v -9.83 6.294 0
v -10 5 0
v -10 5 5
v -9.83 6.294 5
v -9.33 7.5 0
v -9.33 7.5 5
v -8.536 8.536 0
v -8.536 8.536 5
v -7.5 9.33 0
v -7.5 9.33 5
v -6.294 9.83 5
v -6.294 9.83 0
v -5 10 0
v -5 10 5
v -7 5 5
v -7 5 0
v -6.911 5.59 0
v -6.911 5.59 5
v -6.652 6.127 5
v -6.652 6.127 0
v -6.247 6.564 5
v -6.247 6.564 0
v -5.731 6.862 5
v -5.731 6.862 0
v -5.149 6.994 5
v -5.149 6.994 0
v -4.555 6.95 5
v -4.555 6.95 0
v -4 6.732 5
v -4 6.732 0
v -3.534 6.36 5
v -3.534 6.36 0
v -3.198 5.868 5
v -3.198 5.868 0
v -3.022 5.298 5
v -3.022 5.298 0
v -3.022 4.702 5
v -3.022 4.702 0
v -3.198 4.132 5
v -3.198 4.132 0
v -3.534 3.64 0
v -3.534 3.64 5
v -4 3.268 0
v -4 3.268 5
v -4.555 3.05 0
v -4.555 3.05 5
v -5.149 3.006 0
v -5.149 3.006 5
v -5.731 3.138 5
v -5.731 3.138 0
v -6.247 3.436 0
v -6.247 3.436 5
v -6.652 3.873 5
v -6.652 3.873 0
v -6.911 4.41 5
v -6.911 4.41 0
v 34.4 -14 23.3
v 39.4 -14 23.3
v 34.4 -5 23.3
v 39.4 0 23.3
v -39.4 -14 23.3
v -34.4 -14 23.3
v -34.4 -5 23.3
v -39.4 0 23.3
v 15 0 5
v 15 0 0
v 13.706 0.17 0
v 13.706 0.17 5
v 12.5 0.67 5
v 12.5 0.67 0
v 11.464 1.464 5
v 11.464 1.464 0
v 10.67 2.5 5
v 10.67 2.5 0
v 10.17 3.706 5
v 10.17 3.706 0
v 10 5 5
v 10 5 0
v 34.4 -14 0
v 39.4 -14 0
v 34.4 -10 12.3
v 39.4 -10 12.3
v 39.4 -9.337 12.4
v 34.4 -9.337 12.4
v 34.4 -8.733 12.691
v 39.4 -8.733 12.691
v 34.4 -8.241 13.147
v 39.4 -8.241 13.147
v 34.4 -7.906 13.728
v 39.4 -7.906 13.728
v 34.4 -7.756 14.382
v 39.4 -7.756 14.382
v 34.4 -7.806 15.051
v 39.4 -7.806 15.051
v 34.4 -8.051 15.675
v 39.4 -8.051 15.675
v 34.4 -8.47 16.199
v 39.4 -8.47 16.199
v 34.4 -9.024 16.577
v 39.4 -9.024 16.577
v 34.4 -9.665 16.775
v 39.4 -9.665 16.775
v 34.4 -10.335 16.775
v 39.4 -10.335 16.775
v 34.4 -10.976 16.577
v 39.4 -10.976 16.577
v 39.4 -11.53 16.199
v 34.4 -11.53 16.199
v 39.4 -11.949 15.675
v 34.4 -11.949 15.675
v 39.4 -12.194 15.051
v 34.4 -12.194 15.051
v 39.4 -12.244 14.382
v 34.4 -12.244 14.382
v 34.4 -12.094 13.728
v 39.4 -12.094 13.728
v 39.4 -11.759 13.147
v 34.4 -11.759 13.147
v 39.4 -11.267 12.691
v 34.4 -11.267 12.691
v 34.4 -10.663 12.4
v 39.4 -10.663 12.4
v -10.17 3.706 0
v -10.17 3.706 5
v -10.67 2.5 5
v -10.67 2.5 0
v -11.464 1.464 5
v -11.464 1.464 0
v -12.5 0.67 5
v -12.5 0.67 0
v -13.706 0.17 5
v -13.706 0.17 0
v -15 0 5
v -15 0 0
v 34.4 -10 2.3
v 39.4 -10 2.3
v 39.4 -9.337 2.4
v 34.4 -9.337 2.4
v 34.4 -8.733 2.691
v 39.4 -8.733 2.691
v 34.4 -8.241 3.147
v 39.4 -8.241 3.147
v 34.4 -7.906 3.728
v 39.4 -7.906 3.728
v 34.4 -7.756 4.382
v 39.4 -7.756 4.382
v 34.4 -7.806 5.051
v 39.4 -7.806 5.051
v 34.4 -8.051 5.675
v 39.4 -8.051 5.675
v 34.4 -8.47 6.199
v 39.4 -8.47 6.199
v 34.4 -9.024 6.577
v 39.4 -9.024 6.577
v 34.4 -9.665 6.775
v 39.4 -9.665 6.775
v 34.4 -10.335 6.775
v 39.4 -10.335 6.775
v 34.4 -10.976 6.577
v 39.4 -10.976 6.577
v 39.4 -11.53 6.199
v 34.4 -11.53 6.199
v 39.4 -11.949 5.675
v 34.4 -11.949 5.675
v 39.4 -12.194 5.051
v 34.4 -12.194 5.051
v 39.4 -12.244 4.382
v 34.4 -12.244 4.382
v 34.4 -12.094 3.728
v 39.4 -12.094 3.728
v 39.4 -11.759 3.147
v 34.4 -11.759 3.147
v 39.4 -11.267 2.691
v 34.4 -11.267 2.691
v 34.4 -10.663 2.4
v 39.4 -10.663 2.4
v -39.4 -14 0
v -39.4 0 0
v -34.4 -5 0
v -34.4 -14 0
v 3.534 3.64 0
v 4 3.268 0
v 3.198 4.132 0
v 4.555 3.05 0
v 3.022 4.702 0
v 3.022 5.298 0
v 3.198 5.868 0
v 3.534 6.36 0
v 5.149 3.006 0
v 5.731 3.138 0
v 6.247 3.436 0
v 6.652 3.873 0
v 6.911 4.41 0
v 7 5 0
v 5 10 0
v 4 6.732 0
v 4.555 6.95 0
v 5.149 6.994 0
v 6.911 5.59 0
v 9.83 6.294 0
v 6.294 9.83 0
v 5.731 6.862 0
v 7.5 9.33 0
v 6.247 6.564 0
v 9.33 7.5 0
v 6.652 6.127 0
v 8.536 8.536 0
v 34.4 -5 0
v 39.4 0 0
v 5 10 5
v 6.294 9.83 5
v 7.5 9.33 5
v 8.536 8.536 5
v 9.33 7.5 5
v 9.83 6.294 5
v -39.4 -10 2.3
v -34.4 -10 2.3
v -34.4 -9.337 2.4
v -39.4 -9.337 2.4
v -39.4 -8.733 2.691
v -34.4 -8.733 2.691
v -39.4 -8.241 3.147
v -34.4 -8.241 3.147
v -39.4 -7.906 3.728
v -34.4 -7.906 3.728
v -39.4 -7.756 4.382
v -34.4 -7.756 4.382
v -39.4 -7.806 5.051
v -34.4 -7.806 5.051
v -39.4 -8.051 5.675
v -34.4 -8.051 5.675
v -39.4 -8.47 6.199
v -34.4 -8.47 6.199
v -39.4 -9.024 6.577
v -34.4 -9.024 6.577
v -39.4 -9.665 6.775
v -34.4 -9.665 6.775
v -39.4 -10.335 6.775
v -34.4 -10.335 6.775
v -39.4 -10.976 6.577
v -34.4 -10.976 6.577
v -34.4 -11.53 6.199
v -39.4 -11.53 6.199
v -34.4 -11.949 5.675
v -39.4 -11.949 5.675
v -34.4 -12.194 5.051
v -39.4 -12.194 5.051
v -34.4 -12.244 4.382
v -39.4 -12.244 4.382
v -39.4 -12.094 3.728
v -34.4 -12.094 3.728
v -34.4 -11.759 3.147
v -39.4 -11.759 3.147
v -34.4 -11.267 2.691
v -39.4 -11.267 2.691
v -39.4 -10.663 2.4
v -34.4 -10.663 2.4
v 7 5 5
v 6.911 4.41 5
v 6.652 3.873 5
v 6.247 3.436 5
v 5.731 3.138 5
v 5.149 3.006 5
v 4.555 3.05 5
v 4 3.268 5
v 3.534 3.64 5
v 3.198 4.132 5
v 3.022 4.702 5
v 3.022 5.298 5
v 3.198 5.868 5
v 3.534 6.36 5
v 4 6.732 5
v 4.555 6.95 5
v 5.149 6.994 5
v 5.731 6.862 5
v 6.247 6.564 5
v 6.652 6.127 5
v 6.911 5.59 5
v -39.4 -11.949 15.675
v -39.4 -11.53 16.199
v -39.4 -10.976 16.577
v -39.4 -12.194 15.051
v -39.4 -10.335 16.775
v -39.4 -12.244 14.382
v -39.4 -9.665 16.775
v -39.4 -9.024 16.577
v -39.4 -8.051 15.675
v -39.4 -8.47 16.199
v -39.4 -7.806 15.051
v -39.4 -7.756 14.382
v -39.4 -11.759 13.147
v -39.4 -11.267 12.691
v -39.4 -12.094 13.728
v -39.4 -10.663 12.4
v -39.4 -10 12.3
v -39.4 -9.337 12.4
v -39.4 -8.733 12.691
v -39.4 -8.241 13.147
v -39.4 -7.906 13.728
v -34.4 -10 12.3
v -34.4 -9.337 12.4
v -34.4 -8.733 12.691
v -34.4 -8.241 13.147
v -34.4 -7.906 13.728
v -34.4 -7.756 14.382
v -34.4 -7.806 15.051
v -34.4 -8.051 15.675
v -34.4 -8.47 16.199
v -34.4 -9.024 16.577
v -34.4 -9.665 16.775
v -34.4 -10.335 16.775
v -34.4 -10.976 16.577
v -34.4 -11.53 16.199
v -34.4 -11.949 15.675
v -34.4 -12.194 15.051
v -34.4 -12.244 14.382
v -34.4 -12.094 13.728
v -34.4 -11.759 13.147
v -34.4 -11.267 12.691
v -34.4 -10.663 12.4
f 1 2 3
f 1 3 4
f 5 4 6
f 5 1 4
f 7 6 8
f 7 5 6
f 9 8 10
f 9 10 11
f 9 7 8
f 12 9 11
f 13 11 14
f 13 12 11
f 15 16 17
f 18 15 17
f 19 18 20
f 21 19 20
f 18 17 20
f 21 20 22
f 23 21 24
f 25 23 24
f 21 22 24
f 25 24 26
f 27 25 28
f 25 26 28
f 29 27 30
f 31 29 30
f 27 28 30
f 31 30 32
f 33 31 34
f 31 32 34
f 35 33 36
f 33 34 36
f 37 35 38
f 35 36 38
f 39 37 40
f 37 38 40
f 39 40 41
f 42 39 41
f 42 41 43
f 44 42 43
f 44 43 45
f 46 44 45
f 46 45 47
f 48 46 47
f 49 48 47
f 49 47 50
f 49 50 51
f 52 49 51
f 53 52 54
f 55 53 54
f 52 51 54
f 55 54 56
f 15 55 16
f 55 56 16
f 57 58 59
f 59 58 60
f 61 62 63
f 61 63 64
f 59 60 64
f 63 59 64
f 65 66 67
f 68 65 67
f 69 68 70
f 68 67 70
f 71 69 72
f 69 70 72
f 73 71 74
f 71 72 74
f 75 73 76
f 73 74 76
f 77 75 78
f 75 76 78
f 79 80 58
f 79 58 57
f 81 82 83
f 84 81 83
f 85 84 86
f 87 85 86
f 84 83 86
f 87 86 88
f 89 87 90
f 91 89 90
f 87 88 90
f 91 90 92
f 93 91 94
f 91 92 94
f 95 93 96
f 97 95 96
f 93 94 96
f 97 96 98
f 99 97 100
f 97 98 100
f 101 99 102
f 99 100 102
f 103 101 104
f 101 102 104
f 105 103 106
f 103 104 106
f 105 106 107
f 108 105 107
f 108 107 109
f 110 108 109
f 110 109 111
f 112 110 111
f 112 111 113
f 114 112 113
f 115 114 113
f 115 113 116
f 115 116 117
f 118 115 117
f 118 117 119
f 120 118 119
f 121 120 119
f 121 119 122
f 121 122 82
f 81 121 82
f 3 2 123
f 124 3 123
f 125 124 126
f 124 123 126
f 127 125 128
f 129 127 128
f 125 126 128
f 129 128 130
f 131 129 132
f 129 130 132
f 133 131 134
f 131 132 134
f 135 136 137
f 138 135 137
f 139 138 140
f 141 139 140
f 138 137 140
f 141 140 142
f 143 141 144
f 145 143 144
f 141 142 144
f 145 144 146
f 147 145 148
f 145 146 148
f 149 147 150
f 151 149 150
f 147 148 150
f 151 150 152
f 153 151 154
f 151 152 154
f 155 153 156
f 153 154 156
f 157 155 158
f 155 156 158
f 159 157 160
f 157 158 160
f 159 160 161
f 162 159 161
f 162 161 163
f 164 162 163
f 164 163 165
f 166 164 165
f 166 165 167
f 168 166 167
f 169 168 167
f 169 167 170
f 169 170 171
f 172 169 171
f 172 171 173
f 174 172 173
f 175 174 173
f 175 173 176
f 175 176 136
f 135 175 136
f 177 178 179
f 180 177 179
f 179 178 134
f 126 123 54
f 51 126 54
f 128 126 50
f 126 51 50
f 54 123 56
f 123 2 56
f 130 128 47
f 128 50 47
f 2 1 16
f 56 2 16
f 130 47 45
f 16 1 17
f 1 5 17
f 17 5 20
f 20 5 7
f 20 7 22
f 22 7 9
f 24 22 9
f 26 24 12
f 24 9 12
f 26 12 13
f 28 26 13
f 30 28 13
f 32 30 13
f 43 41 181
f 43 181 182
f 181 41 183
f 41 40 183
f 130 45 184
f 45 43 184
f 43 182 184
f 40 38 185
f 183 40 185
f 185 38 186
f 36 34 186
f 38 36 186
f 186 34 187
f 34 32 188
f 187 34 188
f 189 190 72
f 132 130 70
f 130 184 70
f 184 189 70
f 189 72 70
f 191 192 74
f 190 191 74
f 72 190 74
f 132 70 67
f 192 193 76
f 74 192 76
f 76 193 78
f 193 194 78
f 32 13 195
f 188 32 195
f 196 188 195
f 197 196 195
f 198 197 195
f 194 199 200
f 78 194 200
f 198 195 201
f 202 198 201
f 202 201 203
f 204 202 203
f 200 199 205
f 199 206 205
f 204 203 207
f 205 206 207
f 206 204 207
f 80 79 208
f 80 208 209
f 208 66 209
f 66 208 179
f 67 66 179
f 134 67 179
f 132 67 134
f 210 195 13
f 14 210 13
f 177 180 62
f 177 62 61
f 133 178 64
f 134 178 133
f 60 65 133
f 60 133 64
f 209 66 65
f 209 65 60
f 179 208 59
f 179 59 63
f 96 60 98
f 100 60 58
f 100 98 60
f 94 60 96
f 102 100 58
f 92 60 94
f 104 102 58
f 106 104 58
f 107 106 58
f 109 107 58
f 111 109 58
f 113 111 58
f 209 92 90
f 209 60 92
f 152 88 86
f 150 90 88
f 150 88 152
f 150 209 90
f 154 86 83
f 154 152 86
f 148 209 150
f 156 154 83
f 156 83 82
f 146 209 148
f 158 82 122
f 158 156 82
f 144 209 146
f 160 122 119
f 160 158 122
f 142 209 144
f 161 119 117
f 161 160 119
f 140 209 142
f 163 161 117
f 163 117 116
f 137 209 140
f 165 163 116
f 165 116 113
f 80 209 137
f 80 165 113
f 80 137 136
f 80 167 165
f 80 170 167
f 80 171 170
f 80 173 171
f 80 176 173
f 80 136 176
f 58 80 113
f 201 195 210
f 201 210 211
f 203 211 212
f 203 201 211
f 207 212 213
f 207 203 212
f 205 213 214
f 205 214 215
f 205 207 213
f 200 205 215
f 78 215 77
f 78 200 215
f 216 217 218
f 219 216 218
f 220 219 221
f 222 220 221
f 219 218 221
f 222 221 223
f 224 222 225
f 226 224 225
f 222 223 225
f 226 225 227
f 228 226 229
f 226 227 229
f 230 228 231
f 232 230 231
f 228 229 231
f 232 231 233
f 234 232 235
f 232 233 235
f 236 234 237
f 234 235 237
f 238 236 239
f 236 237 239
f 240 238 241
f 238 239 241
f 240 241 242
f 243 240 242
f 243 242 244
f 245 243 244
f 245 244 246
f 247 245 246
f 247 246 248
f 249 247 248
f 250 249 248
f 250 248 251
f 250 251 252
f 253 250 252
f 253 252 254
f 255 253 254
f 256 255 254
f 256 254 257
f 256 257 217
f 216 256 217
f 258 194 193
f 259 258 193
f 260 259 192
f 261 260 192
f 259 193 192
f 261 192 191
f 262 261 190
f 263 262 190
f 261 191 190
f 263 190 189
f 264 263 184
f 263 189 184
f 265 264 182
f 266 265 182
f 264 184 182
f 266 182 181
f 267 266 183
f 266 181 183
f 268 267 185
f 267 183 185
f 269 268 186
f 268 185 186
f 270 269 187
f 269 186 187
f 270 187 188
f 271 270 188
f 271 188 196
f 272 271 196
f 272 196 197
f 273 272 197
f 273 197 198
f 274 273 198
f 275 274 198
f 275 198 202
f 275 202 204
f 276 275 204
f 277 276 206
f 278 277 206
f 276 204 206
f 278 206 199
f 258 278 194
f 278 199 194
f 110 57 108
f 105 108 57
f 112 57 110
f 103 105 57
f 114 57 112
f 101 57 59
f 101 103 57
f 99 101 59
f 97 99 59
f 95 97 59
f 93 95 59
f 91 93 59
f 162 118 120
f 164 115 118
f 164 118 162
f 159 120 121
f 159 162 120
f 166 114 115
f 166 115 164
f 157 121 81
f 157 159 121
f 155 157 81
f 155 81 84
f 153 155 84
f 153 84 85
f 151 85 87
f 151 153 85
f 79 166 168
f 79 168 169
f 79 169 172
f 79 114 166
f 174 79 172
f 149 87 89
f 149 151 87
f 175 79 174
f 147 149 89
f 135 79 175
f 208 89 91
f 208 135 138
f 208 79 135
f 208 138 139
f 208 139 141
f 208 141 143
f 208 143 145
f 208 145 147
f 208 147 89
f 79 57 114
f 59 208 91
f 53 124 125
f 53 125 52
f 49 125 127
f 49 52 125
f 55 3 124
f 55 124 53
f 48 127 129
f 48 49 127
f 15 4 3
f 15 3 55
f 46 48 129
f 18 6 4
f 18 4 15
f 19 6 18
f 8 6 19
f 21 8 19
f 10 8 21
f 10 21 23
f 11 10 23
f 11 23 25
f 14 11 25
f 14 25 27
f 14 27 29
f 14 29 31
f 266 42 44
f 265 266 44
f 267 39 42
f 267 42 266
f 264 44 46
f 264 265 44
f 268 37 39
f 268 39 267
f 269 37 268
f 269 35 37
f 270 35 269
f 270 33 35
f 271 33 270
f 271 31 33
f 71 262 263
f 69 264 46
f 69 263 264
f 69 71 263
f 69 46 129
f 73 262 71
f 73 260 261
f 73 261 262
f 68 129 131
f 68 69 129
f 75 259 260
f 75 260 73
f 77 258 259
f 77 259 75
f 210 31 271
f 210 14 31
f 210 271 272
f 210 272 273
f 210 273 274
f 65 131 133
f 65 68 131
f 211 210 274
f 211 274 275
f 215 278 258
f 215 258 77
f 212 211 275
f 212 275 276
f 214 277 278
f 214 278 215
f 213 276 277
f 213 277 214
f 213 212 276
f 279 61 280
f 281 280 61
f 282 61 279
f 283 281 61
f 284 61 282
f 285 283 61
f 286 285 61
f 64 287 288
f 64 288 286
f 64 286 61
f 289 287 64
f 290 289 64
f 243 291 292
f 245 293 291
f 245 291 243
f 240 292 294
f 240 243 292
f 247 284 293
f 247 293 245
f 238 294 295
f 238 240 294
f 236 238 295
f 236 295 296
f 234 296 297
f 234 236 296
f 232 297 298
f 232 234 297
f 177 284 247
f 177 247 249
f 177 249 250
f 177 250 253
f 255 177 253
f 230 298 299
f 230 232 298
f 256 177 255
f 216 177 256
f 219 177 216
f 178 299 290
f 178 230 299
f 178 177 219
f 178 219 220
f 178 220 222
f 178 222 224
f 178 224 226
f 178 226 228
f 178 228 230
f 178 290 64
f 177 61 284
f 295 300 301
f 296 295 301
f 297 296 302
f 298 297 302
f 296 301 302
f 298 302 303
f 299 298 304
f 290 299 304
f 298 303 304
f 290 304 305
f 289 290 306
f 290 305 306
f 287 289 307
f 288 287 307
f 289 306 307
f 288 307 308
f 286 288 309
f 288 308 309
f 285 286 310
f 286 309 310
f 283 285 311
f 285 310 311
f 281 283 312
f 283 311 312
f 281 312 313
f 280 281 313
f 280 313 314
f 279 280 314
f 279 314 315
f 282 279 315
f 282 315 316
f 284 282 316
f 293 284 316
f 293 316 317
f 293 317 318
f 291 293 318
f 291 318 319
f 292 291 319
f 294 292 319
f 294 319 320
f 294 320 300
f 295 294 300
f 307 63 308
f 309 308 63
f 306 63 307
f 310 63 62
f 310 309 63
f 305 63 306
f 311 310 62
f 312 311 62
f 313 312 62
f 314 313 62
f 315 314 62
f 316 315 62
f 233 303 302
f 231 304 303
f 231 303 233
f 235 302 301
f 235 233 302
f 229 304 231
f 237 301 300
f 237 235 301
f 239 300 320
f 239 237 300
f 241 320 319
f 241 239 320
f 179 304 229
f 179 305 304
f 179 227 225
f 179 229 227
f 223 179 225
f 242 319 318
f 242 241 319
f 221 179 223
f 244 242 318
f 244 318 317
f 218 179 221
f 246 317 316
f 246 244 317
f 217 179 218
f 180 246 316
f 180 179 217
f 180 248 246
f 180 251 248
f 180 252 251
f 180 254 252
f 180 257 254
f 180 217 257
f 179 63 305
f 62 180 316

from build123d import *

# Parameters (mm, degrees)
BOSS_EXTRUDE1_DEPTH = 23.3
SKETCH2_W           = 20
SKETCH2_H           = 10
SKETCH2_R           = 2
BOSS_EXTRUDE2_DEPTH = 5
FILLET1_START       = -1
FILLET1_DEPTH       = 6
FILLET1_2_DEPTH     = 5
SKETCH3_R           = 2.25
CUT_EXTRUDE1_DEPTH  = 124


with BuildPart() as part:
    # Sketch1 → Boss-Extrude1 (new body)
    with BuildSketch(Plane.XY):
        Polygon((-39.4, -14), (-39.4, 0), (39.4, 0), (39.4, -14), (34.4, -14), (34.4, -5), (-34.4, -5), (-34.4, -14), align=None)
    extrude(amount=BOSS_EXTRUDE1_DEPTH)

    # Sketch2 → Boss-Extrude2 (add)
    with BuildSketch(Plane(origin=(0, 0, 0), x_dir=(-1, 0, 0), z_dir=(0, 0, -1))):
        with Locations((0, 5)):
            Rectangle(SKETCH2_W, SKETCH2_H)
        with Locations((5, 5)):
            Circle(SKETCH2_R, mode=Mode.SUBTRACT)
        with Locations(Location((-5, 5, 0), (0, 0, 180))):
            Circle(SKETCH2_R, mode=Mode.SUBTRACT)
    extrude(amount=-BOSS_EXTRUDE2_DEPTH)

    # Fillet1: read off the stored shape, not the designer's step
    # Fillet1 outline → Fillet1 (cut)
    with BuildSketch(Plane.XY.offset(FILLET1_START)):
        with BuildLine():
            Line((-10, 10), (-10, 5))
            ThreePointArc((-10, 5), (-8.535533906, 8.535533906), (-5, 10))
            Line((-5, 10), (-10, 10))
        make_face()
        with BuildLine():
            Line((10, 10), (5, 10))
            ThreePointArc((5, 10), (8.535533906, 8.535533906), (10, 5))
            Line((10, 5), (10, 10))
        make_face()
    extrude(amount=FILLET1_DEPTH, mode=Mode.SUBTRACT)

    # Fillet1 2 outline → Fillet1 2 (add)
    with BuildSketch(Plane.XY):
        with BuildLine():
            Line((-10, 0), (-10, 5))
            ThreePointArc((-10, 5), (-11.464466094, 1.464466094), (-15, 0))
            Line((-15, 0), (-10, 0))
        make_face()
        with BuildLine():
            Line((10, 5), (10, 0))
            Line((10, 0), (15, 0))
            ThreePointArc((15, 0), (11.464466094, 1.464466094), (10, 5))
        make_face()
    extrude(amount=FILLET1_2_DEPTH)

    # Sketch3 → Cut-Extrude1 (cut)
    with BuildSketch(Plane(origin=(39.4, 0, 0), x_dir=(0, 0, -1), z_dir=(1, 0, 0))):
        with Locations((-4.55, -10)):
            Circle(SKETCH3_R)
        with Locations((-14.55, -10)):
            Circle(SKETCH3_R)
    extrude(amount=-CUT_EXTRUDE1_DEPTH, mode=Mode.SUBTRACT)


solid = part.part
